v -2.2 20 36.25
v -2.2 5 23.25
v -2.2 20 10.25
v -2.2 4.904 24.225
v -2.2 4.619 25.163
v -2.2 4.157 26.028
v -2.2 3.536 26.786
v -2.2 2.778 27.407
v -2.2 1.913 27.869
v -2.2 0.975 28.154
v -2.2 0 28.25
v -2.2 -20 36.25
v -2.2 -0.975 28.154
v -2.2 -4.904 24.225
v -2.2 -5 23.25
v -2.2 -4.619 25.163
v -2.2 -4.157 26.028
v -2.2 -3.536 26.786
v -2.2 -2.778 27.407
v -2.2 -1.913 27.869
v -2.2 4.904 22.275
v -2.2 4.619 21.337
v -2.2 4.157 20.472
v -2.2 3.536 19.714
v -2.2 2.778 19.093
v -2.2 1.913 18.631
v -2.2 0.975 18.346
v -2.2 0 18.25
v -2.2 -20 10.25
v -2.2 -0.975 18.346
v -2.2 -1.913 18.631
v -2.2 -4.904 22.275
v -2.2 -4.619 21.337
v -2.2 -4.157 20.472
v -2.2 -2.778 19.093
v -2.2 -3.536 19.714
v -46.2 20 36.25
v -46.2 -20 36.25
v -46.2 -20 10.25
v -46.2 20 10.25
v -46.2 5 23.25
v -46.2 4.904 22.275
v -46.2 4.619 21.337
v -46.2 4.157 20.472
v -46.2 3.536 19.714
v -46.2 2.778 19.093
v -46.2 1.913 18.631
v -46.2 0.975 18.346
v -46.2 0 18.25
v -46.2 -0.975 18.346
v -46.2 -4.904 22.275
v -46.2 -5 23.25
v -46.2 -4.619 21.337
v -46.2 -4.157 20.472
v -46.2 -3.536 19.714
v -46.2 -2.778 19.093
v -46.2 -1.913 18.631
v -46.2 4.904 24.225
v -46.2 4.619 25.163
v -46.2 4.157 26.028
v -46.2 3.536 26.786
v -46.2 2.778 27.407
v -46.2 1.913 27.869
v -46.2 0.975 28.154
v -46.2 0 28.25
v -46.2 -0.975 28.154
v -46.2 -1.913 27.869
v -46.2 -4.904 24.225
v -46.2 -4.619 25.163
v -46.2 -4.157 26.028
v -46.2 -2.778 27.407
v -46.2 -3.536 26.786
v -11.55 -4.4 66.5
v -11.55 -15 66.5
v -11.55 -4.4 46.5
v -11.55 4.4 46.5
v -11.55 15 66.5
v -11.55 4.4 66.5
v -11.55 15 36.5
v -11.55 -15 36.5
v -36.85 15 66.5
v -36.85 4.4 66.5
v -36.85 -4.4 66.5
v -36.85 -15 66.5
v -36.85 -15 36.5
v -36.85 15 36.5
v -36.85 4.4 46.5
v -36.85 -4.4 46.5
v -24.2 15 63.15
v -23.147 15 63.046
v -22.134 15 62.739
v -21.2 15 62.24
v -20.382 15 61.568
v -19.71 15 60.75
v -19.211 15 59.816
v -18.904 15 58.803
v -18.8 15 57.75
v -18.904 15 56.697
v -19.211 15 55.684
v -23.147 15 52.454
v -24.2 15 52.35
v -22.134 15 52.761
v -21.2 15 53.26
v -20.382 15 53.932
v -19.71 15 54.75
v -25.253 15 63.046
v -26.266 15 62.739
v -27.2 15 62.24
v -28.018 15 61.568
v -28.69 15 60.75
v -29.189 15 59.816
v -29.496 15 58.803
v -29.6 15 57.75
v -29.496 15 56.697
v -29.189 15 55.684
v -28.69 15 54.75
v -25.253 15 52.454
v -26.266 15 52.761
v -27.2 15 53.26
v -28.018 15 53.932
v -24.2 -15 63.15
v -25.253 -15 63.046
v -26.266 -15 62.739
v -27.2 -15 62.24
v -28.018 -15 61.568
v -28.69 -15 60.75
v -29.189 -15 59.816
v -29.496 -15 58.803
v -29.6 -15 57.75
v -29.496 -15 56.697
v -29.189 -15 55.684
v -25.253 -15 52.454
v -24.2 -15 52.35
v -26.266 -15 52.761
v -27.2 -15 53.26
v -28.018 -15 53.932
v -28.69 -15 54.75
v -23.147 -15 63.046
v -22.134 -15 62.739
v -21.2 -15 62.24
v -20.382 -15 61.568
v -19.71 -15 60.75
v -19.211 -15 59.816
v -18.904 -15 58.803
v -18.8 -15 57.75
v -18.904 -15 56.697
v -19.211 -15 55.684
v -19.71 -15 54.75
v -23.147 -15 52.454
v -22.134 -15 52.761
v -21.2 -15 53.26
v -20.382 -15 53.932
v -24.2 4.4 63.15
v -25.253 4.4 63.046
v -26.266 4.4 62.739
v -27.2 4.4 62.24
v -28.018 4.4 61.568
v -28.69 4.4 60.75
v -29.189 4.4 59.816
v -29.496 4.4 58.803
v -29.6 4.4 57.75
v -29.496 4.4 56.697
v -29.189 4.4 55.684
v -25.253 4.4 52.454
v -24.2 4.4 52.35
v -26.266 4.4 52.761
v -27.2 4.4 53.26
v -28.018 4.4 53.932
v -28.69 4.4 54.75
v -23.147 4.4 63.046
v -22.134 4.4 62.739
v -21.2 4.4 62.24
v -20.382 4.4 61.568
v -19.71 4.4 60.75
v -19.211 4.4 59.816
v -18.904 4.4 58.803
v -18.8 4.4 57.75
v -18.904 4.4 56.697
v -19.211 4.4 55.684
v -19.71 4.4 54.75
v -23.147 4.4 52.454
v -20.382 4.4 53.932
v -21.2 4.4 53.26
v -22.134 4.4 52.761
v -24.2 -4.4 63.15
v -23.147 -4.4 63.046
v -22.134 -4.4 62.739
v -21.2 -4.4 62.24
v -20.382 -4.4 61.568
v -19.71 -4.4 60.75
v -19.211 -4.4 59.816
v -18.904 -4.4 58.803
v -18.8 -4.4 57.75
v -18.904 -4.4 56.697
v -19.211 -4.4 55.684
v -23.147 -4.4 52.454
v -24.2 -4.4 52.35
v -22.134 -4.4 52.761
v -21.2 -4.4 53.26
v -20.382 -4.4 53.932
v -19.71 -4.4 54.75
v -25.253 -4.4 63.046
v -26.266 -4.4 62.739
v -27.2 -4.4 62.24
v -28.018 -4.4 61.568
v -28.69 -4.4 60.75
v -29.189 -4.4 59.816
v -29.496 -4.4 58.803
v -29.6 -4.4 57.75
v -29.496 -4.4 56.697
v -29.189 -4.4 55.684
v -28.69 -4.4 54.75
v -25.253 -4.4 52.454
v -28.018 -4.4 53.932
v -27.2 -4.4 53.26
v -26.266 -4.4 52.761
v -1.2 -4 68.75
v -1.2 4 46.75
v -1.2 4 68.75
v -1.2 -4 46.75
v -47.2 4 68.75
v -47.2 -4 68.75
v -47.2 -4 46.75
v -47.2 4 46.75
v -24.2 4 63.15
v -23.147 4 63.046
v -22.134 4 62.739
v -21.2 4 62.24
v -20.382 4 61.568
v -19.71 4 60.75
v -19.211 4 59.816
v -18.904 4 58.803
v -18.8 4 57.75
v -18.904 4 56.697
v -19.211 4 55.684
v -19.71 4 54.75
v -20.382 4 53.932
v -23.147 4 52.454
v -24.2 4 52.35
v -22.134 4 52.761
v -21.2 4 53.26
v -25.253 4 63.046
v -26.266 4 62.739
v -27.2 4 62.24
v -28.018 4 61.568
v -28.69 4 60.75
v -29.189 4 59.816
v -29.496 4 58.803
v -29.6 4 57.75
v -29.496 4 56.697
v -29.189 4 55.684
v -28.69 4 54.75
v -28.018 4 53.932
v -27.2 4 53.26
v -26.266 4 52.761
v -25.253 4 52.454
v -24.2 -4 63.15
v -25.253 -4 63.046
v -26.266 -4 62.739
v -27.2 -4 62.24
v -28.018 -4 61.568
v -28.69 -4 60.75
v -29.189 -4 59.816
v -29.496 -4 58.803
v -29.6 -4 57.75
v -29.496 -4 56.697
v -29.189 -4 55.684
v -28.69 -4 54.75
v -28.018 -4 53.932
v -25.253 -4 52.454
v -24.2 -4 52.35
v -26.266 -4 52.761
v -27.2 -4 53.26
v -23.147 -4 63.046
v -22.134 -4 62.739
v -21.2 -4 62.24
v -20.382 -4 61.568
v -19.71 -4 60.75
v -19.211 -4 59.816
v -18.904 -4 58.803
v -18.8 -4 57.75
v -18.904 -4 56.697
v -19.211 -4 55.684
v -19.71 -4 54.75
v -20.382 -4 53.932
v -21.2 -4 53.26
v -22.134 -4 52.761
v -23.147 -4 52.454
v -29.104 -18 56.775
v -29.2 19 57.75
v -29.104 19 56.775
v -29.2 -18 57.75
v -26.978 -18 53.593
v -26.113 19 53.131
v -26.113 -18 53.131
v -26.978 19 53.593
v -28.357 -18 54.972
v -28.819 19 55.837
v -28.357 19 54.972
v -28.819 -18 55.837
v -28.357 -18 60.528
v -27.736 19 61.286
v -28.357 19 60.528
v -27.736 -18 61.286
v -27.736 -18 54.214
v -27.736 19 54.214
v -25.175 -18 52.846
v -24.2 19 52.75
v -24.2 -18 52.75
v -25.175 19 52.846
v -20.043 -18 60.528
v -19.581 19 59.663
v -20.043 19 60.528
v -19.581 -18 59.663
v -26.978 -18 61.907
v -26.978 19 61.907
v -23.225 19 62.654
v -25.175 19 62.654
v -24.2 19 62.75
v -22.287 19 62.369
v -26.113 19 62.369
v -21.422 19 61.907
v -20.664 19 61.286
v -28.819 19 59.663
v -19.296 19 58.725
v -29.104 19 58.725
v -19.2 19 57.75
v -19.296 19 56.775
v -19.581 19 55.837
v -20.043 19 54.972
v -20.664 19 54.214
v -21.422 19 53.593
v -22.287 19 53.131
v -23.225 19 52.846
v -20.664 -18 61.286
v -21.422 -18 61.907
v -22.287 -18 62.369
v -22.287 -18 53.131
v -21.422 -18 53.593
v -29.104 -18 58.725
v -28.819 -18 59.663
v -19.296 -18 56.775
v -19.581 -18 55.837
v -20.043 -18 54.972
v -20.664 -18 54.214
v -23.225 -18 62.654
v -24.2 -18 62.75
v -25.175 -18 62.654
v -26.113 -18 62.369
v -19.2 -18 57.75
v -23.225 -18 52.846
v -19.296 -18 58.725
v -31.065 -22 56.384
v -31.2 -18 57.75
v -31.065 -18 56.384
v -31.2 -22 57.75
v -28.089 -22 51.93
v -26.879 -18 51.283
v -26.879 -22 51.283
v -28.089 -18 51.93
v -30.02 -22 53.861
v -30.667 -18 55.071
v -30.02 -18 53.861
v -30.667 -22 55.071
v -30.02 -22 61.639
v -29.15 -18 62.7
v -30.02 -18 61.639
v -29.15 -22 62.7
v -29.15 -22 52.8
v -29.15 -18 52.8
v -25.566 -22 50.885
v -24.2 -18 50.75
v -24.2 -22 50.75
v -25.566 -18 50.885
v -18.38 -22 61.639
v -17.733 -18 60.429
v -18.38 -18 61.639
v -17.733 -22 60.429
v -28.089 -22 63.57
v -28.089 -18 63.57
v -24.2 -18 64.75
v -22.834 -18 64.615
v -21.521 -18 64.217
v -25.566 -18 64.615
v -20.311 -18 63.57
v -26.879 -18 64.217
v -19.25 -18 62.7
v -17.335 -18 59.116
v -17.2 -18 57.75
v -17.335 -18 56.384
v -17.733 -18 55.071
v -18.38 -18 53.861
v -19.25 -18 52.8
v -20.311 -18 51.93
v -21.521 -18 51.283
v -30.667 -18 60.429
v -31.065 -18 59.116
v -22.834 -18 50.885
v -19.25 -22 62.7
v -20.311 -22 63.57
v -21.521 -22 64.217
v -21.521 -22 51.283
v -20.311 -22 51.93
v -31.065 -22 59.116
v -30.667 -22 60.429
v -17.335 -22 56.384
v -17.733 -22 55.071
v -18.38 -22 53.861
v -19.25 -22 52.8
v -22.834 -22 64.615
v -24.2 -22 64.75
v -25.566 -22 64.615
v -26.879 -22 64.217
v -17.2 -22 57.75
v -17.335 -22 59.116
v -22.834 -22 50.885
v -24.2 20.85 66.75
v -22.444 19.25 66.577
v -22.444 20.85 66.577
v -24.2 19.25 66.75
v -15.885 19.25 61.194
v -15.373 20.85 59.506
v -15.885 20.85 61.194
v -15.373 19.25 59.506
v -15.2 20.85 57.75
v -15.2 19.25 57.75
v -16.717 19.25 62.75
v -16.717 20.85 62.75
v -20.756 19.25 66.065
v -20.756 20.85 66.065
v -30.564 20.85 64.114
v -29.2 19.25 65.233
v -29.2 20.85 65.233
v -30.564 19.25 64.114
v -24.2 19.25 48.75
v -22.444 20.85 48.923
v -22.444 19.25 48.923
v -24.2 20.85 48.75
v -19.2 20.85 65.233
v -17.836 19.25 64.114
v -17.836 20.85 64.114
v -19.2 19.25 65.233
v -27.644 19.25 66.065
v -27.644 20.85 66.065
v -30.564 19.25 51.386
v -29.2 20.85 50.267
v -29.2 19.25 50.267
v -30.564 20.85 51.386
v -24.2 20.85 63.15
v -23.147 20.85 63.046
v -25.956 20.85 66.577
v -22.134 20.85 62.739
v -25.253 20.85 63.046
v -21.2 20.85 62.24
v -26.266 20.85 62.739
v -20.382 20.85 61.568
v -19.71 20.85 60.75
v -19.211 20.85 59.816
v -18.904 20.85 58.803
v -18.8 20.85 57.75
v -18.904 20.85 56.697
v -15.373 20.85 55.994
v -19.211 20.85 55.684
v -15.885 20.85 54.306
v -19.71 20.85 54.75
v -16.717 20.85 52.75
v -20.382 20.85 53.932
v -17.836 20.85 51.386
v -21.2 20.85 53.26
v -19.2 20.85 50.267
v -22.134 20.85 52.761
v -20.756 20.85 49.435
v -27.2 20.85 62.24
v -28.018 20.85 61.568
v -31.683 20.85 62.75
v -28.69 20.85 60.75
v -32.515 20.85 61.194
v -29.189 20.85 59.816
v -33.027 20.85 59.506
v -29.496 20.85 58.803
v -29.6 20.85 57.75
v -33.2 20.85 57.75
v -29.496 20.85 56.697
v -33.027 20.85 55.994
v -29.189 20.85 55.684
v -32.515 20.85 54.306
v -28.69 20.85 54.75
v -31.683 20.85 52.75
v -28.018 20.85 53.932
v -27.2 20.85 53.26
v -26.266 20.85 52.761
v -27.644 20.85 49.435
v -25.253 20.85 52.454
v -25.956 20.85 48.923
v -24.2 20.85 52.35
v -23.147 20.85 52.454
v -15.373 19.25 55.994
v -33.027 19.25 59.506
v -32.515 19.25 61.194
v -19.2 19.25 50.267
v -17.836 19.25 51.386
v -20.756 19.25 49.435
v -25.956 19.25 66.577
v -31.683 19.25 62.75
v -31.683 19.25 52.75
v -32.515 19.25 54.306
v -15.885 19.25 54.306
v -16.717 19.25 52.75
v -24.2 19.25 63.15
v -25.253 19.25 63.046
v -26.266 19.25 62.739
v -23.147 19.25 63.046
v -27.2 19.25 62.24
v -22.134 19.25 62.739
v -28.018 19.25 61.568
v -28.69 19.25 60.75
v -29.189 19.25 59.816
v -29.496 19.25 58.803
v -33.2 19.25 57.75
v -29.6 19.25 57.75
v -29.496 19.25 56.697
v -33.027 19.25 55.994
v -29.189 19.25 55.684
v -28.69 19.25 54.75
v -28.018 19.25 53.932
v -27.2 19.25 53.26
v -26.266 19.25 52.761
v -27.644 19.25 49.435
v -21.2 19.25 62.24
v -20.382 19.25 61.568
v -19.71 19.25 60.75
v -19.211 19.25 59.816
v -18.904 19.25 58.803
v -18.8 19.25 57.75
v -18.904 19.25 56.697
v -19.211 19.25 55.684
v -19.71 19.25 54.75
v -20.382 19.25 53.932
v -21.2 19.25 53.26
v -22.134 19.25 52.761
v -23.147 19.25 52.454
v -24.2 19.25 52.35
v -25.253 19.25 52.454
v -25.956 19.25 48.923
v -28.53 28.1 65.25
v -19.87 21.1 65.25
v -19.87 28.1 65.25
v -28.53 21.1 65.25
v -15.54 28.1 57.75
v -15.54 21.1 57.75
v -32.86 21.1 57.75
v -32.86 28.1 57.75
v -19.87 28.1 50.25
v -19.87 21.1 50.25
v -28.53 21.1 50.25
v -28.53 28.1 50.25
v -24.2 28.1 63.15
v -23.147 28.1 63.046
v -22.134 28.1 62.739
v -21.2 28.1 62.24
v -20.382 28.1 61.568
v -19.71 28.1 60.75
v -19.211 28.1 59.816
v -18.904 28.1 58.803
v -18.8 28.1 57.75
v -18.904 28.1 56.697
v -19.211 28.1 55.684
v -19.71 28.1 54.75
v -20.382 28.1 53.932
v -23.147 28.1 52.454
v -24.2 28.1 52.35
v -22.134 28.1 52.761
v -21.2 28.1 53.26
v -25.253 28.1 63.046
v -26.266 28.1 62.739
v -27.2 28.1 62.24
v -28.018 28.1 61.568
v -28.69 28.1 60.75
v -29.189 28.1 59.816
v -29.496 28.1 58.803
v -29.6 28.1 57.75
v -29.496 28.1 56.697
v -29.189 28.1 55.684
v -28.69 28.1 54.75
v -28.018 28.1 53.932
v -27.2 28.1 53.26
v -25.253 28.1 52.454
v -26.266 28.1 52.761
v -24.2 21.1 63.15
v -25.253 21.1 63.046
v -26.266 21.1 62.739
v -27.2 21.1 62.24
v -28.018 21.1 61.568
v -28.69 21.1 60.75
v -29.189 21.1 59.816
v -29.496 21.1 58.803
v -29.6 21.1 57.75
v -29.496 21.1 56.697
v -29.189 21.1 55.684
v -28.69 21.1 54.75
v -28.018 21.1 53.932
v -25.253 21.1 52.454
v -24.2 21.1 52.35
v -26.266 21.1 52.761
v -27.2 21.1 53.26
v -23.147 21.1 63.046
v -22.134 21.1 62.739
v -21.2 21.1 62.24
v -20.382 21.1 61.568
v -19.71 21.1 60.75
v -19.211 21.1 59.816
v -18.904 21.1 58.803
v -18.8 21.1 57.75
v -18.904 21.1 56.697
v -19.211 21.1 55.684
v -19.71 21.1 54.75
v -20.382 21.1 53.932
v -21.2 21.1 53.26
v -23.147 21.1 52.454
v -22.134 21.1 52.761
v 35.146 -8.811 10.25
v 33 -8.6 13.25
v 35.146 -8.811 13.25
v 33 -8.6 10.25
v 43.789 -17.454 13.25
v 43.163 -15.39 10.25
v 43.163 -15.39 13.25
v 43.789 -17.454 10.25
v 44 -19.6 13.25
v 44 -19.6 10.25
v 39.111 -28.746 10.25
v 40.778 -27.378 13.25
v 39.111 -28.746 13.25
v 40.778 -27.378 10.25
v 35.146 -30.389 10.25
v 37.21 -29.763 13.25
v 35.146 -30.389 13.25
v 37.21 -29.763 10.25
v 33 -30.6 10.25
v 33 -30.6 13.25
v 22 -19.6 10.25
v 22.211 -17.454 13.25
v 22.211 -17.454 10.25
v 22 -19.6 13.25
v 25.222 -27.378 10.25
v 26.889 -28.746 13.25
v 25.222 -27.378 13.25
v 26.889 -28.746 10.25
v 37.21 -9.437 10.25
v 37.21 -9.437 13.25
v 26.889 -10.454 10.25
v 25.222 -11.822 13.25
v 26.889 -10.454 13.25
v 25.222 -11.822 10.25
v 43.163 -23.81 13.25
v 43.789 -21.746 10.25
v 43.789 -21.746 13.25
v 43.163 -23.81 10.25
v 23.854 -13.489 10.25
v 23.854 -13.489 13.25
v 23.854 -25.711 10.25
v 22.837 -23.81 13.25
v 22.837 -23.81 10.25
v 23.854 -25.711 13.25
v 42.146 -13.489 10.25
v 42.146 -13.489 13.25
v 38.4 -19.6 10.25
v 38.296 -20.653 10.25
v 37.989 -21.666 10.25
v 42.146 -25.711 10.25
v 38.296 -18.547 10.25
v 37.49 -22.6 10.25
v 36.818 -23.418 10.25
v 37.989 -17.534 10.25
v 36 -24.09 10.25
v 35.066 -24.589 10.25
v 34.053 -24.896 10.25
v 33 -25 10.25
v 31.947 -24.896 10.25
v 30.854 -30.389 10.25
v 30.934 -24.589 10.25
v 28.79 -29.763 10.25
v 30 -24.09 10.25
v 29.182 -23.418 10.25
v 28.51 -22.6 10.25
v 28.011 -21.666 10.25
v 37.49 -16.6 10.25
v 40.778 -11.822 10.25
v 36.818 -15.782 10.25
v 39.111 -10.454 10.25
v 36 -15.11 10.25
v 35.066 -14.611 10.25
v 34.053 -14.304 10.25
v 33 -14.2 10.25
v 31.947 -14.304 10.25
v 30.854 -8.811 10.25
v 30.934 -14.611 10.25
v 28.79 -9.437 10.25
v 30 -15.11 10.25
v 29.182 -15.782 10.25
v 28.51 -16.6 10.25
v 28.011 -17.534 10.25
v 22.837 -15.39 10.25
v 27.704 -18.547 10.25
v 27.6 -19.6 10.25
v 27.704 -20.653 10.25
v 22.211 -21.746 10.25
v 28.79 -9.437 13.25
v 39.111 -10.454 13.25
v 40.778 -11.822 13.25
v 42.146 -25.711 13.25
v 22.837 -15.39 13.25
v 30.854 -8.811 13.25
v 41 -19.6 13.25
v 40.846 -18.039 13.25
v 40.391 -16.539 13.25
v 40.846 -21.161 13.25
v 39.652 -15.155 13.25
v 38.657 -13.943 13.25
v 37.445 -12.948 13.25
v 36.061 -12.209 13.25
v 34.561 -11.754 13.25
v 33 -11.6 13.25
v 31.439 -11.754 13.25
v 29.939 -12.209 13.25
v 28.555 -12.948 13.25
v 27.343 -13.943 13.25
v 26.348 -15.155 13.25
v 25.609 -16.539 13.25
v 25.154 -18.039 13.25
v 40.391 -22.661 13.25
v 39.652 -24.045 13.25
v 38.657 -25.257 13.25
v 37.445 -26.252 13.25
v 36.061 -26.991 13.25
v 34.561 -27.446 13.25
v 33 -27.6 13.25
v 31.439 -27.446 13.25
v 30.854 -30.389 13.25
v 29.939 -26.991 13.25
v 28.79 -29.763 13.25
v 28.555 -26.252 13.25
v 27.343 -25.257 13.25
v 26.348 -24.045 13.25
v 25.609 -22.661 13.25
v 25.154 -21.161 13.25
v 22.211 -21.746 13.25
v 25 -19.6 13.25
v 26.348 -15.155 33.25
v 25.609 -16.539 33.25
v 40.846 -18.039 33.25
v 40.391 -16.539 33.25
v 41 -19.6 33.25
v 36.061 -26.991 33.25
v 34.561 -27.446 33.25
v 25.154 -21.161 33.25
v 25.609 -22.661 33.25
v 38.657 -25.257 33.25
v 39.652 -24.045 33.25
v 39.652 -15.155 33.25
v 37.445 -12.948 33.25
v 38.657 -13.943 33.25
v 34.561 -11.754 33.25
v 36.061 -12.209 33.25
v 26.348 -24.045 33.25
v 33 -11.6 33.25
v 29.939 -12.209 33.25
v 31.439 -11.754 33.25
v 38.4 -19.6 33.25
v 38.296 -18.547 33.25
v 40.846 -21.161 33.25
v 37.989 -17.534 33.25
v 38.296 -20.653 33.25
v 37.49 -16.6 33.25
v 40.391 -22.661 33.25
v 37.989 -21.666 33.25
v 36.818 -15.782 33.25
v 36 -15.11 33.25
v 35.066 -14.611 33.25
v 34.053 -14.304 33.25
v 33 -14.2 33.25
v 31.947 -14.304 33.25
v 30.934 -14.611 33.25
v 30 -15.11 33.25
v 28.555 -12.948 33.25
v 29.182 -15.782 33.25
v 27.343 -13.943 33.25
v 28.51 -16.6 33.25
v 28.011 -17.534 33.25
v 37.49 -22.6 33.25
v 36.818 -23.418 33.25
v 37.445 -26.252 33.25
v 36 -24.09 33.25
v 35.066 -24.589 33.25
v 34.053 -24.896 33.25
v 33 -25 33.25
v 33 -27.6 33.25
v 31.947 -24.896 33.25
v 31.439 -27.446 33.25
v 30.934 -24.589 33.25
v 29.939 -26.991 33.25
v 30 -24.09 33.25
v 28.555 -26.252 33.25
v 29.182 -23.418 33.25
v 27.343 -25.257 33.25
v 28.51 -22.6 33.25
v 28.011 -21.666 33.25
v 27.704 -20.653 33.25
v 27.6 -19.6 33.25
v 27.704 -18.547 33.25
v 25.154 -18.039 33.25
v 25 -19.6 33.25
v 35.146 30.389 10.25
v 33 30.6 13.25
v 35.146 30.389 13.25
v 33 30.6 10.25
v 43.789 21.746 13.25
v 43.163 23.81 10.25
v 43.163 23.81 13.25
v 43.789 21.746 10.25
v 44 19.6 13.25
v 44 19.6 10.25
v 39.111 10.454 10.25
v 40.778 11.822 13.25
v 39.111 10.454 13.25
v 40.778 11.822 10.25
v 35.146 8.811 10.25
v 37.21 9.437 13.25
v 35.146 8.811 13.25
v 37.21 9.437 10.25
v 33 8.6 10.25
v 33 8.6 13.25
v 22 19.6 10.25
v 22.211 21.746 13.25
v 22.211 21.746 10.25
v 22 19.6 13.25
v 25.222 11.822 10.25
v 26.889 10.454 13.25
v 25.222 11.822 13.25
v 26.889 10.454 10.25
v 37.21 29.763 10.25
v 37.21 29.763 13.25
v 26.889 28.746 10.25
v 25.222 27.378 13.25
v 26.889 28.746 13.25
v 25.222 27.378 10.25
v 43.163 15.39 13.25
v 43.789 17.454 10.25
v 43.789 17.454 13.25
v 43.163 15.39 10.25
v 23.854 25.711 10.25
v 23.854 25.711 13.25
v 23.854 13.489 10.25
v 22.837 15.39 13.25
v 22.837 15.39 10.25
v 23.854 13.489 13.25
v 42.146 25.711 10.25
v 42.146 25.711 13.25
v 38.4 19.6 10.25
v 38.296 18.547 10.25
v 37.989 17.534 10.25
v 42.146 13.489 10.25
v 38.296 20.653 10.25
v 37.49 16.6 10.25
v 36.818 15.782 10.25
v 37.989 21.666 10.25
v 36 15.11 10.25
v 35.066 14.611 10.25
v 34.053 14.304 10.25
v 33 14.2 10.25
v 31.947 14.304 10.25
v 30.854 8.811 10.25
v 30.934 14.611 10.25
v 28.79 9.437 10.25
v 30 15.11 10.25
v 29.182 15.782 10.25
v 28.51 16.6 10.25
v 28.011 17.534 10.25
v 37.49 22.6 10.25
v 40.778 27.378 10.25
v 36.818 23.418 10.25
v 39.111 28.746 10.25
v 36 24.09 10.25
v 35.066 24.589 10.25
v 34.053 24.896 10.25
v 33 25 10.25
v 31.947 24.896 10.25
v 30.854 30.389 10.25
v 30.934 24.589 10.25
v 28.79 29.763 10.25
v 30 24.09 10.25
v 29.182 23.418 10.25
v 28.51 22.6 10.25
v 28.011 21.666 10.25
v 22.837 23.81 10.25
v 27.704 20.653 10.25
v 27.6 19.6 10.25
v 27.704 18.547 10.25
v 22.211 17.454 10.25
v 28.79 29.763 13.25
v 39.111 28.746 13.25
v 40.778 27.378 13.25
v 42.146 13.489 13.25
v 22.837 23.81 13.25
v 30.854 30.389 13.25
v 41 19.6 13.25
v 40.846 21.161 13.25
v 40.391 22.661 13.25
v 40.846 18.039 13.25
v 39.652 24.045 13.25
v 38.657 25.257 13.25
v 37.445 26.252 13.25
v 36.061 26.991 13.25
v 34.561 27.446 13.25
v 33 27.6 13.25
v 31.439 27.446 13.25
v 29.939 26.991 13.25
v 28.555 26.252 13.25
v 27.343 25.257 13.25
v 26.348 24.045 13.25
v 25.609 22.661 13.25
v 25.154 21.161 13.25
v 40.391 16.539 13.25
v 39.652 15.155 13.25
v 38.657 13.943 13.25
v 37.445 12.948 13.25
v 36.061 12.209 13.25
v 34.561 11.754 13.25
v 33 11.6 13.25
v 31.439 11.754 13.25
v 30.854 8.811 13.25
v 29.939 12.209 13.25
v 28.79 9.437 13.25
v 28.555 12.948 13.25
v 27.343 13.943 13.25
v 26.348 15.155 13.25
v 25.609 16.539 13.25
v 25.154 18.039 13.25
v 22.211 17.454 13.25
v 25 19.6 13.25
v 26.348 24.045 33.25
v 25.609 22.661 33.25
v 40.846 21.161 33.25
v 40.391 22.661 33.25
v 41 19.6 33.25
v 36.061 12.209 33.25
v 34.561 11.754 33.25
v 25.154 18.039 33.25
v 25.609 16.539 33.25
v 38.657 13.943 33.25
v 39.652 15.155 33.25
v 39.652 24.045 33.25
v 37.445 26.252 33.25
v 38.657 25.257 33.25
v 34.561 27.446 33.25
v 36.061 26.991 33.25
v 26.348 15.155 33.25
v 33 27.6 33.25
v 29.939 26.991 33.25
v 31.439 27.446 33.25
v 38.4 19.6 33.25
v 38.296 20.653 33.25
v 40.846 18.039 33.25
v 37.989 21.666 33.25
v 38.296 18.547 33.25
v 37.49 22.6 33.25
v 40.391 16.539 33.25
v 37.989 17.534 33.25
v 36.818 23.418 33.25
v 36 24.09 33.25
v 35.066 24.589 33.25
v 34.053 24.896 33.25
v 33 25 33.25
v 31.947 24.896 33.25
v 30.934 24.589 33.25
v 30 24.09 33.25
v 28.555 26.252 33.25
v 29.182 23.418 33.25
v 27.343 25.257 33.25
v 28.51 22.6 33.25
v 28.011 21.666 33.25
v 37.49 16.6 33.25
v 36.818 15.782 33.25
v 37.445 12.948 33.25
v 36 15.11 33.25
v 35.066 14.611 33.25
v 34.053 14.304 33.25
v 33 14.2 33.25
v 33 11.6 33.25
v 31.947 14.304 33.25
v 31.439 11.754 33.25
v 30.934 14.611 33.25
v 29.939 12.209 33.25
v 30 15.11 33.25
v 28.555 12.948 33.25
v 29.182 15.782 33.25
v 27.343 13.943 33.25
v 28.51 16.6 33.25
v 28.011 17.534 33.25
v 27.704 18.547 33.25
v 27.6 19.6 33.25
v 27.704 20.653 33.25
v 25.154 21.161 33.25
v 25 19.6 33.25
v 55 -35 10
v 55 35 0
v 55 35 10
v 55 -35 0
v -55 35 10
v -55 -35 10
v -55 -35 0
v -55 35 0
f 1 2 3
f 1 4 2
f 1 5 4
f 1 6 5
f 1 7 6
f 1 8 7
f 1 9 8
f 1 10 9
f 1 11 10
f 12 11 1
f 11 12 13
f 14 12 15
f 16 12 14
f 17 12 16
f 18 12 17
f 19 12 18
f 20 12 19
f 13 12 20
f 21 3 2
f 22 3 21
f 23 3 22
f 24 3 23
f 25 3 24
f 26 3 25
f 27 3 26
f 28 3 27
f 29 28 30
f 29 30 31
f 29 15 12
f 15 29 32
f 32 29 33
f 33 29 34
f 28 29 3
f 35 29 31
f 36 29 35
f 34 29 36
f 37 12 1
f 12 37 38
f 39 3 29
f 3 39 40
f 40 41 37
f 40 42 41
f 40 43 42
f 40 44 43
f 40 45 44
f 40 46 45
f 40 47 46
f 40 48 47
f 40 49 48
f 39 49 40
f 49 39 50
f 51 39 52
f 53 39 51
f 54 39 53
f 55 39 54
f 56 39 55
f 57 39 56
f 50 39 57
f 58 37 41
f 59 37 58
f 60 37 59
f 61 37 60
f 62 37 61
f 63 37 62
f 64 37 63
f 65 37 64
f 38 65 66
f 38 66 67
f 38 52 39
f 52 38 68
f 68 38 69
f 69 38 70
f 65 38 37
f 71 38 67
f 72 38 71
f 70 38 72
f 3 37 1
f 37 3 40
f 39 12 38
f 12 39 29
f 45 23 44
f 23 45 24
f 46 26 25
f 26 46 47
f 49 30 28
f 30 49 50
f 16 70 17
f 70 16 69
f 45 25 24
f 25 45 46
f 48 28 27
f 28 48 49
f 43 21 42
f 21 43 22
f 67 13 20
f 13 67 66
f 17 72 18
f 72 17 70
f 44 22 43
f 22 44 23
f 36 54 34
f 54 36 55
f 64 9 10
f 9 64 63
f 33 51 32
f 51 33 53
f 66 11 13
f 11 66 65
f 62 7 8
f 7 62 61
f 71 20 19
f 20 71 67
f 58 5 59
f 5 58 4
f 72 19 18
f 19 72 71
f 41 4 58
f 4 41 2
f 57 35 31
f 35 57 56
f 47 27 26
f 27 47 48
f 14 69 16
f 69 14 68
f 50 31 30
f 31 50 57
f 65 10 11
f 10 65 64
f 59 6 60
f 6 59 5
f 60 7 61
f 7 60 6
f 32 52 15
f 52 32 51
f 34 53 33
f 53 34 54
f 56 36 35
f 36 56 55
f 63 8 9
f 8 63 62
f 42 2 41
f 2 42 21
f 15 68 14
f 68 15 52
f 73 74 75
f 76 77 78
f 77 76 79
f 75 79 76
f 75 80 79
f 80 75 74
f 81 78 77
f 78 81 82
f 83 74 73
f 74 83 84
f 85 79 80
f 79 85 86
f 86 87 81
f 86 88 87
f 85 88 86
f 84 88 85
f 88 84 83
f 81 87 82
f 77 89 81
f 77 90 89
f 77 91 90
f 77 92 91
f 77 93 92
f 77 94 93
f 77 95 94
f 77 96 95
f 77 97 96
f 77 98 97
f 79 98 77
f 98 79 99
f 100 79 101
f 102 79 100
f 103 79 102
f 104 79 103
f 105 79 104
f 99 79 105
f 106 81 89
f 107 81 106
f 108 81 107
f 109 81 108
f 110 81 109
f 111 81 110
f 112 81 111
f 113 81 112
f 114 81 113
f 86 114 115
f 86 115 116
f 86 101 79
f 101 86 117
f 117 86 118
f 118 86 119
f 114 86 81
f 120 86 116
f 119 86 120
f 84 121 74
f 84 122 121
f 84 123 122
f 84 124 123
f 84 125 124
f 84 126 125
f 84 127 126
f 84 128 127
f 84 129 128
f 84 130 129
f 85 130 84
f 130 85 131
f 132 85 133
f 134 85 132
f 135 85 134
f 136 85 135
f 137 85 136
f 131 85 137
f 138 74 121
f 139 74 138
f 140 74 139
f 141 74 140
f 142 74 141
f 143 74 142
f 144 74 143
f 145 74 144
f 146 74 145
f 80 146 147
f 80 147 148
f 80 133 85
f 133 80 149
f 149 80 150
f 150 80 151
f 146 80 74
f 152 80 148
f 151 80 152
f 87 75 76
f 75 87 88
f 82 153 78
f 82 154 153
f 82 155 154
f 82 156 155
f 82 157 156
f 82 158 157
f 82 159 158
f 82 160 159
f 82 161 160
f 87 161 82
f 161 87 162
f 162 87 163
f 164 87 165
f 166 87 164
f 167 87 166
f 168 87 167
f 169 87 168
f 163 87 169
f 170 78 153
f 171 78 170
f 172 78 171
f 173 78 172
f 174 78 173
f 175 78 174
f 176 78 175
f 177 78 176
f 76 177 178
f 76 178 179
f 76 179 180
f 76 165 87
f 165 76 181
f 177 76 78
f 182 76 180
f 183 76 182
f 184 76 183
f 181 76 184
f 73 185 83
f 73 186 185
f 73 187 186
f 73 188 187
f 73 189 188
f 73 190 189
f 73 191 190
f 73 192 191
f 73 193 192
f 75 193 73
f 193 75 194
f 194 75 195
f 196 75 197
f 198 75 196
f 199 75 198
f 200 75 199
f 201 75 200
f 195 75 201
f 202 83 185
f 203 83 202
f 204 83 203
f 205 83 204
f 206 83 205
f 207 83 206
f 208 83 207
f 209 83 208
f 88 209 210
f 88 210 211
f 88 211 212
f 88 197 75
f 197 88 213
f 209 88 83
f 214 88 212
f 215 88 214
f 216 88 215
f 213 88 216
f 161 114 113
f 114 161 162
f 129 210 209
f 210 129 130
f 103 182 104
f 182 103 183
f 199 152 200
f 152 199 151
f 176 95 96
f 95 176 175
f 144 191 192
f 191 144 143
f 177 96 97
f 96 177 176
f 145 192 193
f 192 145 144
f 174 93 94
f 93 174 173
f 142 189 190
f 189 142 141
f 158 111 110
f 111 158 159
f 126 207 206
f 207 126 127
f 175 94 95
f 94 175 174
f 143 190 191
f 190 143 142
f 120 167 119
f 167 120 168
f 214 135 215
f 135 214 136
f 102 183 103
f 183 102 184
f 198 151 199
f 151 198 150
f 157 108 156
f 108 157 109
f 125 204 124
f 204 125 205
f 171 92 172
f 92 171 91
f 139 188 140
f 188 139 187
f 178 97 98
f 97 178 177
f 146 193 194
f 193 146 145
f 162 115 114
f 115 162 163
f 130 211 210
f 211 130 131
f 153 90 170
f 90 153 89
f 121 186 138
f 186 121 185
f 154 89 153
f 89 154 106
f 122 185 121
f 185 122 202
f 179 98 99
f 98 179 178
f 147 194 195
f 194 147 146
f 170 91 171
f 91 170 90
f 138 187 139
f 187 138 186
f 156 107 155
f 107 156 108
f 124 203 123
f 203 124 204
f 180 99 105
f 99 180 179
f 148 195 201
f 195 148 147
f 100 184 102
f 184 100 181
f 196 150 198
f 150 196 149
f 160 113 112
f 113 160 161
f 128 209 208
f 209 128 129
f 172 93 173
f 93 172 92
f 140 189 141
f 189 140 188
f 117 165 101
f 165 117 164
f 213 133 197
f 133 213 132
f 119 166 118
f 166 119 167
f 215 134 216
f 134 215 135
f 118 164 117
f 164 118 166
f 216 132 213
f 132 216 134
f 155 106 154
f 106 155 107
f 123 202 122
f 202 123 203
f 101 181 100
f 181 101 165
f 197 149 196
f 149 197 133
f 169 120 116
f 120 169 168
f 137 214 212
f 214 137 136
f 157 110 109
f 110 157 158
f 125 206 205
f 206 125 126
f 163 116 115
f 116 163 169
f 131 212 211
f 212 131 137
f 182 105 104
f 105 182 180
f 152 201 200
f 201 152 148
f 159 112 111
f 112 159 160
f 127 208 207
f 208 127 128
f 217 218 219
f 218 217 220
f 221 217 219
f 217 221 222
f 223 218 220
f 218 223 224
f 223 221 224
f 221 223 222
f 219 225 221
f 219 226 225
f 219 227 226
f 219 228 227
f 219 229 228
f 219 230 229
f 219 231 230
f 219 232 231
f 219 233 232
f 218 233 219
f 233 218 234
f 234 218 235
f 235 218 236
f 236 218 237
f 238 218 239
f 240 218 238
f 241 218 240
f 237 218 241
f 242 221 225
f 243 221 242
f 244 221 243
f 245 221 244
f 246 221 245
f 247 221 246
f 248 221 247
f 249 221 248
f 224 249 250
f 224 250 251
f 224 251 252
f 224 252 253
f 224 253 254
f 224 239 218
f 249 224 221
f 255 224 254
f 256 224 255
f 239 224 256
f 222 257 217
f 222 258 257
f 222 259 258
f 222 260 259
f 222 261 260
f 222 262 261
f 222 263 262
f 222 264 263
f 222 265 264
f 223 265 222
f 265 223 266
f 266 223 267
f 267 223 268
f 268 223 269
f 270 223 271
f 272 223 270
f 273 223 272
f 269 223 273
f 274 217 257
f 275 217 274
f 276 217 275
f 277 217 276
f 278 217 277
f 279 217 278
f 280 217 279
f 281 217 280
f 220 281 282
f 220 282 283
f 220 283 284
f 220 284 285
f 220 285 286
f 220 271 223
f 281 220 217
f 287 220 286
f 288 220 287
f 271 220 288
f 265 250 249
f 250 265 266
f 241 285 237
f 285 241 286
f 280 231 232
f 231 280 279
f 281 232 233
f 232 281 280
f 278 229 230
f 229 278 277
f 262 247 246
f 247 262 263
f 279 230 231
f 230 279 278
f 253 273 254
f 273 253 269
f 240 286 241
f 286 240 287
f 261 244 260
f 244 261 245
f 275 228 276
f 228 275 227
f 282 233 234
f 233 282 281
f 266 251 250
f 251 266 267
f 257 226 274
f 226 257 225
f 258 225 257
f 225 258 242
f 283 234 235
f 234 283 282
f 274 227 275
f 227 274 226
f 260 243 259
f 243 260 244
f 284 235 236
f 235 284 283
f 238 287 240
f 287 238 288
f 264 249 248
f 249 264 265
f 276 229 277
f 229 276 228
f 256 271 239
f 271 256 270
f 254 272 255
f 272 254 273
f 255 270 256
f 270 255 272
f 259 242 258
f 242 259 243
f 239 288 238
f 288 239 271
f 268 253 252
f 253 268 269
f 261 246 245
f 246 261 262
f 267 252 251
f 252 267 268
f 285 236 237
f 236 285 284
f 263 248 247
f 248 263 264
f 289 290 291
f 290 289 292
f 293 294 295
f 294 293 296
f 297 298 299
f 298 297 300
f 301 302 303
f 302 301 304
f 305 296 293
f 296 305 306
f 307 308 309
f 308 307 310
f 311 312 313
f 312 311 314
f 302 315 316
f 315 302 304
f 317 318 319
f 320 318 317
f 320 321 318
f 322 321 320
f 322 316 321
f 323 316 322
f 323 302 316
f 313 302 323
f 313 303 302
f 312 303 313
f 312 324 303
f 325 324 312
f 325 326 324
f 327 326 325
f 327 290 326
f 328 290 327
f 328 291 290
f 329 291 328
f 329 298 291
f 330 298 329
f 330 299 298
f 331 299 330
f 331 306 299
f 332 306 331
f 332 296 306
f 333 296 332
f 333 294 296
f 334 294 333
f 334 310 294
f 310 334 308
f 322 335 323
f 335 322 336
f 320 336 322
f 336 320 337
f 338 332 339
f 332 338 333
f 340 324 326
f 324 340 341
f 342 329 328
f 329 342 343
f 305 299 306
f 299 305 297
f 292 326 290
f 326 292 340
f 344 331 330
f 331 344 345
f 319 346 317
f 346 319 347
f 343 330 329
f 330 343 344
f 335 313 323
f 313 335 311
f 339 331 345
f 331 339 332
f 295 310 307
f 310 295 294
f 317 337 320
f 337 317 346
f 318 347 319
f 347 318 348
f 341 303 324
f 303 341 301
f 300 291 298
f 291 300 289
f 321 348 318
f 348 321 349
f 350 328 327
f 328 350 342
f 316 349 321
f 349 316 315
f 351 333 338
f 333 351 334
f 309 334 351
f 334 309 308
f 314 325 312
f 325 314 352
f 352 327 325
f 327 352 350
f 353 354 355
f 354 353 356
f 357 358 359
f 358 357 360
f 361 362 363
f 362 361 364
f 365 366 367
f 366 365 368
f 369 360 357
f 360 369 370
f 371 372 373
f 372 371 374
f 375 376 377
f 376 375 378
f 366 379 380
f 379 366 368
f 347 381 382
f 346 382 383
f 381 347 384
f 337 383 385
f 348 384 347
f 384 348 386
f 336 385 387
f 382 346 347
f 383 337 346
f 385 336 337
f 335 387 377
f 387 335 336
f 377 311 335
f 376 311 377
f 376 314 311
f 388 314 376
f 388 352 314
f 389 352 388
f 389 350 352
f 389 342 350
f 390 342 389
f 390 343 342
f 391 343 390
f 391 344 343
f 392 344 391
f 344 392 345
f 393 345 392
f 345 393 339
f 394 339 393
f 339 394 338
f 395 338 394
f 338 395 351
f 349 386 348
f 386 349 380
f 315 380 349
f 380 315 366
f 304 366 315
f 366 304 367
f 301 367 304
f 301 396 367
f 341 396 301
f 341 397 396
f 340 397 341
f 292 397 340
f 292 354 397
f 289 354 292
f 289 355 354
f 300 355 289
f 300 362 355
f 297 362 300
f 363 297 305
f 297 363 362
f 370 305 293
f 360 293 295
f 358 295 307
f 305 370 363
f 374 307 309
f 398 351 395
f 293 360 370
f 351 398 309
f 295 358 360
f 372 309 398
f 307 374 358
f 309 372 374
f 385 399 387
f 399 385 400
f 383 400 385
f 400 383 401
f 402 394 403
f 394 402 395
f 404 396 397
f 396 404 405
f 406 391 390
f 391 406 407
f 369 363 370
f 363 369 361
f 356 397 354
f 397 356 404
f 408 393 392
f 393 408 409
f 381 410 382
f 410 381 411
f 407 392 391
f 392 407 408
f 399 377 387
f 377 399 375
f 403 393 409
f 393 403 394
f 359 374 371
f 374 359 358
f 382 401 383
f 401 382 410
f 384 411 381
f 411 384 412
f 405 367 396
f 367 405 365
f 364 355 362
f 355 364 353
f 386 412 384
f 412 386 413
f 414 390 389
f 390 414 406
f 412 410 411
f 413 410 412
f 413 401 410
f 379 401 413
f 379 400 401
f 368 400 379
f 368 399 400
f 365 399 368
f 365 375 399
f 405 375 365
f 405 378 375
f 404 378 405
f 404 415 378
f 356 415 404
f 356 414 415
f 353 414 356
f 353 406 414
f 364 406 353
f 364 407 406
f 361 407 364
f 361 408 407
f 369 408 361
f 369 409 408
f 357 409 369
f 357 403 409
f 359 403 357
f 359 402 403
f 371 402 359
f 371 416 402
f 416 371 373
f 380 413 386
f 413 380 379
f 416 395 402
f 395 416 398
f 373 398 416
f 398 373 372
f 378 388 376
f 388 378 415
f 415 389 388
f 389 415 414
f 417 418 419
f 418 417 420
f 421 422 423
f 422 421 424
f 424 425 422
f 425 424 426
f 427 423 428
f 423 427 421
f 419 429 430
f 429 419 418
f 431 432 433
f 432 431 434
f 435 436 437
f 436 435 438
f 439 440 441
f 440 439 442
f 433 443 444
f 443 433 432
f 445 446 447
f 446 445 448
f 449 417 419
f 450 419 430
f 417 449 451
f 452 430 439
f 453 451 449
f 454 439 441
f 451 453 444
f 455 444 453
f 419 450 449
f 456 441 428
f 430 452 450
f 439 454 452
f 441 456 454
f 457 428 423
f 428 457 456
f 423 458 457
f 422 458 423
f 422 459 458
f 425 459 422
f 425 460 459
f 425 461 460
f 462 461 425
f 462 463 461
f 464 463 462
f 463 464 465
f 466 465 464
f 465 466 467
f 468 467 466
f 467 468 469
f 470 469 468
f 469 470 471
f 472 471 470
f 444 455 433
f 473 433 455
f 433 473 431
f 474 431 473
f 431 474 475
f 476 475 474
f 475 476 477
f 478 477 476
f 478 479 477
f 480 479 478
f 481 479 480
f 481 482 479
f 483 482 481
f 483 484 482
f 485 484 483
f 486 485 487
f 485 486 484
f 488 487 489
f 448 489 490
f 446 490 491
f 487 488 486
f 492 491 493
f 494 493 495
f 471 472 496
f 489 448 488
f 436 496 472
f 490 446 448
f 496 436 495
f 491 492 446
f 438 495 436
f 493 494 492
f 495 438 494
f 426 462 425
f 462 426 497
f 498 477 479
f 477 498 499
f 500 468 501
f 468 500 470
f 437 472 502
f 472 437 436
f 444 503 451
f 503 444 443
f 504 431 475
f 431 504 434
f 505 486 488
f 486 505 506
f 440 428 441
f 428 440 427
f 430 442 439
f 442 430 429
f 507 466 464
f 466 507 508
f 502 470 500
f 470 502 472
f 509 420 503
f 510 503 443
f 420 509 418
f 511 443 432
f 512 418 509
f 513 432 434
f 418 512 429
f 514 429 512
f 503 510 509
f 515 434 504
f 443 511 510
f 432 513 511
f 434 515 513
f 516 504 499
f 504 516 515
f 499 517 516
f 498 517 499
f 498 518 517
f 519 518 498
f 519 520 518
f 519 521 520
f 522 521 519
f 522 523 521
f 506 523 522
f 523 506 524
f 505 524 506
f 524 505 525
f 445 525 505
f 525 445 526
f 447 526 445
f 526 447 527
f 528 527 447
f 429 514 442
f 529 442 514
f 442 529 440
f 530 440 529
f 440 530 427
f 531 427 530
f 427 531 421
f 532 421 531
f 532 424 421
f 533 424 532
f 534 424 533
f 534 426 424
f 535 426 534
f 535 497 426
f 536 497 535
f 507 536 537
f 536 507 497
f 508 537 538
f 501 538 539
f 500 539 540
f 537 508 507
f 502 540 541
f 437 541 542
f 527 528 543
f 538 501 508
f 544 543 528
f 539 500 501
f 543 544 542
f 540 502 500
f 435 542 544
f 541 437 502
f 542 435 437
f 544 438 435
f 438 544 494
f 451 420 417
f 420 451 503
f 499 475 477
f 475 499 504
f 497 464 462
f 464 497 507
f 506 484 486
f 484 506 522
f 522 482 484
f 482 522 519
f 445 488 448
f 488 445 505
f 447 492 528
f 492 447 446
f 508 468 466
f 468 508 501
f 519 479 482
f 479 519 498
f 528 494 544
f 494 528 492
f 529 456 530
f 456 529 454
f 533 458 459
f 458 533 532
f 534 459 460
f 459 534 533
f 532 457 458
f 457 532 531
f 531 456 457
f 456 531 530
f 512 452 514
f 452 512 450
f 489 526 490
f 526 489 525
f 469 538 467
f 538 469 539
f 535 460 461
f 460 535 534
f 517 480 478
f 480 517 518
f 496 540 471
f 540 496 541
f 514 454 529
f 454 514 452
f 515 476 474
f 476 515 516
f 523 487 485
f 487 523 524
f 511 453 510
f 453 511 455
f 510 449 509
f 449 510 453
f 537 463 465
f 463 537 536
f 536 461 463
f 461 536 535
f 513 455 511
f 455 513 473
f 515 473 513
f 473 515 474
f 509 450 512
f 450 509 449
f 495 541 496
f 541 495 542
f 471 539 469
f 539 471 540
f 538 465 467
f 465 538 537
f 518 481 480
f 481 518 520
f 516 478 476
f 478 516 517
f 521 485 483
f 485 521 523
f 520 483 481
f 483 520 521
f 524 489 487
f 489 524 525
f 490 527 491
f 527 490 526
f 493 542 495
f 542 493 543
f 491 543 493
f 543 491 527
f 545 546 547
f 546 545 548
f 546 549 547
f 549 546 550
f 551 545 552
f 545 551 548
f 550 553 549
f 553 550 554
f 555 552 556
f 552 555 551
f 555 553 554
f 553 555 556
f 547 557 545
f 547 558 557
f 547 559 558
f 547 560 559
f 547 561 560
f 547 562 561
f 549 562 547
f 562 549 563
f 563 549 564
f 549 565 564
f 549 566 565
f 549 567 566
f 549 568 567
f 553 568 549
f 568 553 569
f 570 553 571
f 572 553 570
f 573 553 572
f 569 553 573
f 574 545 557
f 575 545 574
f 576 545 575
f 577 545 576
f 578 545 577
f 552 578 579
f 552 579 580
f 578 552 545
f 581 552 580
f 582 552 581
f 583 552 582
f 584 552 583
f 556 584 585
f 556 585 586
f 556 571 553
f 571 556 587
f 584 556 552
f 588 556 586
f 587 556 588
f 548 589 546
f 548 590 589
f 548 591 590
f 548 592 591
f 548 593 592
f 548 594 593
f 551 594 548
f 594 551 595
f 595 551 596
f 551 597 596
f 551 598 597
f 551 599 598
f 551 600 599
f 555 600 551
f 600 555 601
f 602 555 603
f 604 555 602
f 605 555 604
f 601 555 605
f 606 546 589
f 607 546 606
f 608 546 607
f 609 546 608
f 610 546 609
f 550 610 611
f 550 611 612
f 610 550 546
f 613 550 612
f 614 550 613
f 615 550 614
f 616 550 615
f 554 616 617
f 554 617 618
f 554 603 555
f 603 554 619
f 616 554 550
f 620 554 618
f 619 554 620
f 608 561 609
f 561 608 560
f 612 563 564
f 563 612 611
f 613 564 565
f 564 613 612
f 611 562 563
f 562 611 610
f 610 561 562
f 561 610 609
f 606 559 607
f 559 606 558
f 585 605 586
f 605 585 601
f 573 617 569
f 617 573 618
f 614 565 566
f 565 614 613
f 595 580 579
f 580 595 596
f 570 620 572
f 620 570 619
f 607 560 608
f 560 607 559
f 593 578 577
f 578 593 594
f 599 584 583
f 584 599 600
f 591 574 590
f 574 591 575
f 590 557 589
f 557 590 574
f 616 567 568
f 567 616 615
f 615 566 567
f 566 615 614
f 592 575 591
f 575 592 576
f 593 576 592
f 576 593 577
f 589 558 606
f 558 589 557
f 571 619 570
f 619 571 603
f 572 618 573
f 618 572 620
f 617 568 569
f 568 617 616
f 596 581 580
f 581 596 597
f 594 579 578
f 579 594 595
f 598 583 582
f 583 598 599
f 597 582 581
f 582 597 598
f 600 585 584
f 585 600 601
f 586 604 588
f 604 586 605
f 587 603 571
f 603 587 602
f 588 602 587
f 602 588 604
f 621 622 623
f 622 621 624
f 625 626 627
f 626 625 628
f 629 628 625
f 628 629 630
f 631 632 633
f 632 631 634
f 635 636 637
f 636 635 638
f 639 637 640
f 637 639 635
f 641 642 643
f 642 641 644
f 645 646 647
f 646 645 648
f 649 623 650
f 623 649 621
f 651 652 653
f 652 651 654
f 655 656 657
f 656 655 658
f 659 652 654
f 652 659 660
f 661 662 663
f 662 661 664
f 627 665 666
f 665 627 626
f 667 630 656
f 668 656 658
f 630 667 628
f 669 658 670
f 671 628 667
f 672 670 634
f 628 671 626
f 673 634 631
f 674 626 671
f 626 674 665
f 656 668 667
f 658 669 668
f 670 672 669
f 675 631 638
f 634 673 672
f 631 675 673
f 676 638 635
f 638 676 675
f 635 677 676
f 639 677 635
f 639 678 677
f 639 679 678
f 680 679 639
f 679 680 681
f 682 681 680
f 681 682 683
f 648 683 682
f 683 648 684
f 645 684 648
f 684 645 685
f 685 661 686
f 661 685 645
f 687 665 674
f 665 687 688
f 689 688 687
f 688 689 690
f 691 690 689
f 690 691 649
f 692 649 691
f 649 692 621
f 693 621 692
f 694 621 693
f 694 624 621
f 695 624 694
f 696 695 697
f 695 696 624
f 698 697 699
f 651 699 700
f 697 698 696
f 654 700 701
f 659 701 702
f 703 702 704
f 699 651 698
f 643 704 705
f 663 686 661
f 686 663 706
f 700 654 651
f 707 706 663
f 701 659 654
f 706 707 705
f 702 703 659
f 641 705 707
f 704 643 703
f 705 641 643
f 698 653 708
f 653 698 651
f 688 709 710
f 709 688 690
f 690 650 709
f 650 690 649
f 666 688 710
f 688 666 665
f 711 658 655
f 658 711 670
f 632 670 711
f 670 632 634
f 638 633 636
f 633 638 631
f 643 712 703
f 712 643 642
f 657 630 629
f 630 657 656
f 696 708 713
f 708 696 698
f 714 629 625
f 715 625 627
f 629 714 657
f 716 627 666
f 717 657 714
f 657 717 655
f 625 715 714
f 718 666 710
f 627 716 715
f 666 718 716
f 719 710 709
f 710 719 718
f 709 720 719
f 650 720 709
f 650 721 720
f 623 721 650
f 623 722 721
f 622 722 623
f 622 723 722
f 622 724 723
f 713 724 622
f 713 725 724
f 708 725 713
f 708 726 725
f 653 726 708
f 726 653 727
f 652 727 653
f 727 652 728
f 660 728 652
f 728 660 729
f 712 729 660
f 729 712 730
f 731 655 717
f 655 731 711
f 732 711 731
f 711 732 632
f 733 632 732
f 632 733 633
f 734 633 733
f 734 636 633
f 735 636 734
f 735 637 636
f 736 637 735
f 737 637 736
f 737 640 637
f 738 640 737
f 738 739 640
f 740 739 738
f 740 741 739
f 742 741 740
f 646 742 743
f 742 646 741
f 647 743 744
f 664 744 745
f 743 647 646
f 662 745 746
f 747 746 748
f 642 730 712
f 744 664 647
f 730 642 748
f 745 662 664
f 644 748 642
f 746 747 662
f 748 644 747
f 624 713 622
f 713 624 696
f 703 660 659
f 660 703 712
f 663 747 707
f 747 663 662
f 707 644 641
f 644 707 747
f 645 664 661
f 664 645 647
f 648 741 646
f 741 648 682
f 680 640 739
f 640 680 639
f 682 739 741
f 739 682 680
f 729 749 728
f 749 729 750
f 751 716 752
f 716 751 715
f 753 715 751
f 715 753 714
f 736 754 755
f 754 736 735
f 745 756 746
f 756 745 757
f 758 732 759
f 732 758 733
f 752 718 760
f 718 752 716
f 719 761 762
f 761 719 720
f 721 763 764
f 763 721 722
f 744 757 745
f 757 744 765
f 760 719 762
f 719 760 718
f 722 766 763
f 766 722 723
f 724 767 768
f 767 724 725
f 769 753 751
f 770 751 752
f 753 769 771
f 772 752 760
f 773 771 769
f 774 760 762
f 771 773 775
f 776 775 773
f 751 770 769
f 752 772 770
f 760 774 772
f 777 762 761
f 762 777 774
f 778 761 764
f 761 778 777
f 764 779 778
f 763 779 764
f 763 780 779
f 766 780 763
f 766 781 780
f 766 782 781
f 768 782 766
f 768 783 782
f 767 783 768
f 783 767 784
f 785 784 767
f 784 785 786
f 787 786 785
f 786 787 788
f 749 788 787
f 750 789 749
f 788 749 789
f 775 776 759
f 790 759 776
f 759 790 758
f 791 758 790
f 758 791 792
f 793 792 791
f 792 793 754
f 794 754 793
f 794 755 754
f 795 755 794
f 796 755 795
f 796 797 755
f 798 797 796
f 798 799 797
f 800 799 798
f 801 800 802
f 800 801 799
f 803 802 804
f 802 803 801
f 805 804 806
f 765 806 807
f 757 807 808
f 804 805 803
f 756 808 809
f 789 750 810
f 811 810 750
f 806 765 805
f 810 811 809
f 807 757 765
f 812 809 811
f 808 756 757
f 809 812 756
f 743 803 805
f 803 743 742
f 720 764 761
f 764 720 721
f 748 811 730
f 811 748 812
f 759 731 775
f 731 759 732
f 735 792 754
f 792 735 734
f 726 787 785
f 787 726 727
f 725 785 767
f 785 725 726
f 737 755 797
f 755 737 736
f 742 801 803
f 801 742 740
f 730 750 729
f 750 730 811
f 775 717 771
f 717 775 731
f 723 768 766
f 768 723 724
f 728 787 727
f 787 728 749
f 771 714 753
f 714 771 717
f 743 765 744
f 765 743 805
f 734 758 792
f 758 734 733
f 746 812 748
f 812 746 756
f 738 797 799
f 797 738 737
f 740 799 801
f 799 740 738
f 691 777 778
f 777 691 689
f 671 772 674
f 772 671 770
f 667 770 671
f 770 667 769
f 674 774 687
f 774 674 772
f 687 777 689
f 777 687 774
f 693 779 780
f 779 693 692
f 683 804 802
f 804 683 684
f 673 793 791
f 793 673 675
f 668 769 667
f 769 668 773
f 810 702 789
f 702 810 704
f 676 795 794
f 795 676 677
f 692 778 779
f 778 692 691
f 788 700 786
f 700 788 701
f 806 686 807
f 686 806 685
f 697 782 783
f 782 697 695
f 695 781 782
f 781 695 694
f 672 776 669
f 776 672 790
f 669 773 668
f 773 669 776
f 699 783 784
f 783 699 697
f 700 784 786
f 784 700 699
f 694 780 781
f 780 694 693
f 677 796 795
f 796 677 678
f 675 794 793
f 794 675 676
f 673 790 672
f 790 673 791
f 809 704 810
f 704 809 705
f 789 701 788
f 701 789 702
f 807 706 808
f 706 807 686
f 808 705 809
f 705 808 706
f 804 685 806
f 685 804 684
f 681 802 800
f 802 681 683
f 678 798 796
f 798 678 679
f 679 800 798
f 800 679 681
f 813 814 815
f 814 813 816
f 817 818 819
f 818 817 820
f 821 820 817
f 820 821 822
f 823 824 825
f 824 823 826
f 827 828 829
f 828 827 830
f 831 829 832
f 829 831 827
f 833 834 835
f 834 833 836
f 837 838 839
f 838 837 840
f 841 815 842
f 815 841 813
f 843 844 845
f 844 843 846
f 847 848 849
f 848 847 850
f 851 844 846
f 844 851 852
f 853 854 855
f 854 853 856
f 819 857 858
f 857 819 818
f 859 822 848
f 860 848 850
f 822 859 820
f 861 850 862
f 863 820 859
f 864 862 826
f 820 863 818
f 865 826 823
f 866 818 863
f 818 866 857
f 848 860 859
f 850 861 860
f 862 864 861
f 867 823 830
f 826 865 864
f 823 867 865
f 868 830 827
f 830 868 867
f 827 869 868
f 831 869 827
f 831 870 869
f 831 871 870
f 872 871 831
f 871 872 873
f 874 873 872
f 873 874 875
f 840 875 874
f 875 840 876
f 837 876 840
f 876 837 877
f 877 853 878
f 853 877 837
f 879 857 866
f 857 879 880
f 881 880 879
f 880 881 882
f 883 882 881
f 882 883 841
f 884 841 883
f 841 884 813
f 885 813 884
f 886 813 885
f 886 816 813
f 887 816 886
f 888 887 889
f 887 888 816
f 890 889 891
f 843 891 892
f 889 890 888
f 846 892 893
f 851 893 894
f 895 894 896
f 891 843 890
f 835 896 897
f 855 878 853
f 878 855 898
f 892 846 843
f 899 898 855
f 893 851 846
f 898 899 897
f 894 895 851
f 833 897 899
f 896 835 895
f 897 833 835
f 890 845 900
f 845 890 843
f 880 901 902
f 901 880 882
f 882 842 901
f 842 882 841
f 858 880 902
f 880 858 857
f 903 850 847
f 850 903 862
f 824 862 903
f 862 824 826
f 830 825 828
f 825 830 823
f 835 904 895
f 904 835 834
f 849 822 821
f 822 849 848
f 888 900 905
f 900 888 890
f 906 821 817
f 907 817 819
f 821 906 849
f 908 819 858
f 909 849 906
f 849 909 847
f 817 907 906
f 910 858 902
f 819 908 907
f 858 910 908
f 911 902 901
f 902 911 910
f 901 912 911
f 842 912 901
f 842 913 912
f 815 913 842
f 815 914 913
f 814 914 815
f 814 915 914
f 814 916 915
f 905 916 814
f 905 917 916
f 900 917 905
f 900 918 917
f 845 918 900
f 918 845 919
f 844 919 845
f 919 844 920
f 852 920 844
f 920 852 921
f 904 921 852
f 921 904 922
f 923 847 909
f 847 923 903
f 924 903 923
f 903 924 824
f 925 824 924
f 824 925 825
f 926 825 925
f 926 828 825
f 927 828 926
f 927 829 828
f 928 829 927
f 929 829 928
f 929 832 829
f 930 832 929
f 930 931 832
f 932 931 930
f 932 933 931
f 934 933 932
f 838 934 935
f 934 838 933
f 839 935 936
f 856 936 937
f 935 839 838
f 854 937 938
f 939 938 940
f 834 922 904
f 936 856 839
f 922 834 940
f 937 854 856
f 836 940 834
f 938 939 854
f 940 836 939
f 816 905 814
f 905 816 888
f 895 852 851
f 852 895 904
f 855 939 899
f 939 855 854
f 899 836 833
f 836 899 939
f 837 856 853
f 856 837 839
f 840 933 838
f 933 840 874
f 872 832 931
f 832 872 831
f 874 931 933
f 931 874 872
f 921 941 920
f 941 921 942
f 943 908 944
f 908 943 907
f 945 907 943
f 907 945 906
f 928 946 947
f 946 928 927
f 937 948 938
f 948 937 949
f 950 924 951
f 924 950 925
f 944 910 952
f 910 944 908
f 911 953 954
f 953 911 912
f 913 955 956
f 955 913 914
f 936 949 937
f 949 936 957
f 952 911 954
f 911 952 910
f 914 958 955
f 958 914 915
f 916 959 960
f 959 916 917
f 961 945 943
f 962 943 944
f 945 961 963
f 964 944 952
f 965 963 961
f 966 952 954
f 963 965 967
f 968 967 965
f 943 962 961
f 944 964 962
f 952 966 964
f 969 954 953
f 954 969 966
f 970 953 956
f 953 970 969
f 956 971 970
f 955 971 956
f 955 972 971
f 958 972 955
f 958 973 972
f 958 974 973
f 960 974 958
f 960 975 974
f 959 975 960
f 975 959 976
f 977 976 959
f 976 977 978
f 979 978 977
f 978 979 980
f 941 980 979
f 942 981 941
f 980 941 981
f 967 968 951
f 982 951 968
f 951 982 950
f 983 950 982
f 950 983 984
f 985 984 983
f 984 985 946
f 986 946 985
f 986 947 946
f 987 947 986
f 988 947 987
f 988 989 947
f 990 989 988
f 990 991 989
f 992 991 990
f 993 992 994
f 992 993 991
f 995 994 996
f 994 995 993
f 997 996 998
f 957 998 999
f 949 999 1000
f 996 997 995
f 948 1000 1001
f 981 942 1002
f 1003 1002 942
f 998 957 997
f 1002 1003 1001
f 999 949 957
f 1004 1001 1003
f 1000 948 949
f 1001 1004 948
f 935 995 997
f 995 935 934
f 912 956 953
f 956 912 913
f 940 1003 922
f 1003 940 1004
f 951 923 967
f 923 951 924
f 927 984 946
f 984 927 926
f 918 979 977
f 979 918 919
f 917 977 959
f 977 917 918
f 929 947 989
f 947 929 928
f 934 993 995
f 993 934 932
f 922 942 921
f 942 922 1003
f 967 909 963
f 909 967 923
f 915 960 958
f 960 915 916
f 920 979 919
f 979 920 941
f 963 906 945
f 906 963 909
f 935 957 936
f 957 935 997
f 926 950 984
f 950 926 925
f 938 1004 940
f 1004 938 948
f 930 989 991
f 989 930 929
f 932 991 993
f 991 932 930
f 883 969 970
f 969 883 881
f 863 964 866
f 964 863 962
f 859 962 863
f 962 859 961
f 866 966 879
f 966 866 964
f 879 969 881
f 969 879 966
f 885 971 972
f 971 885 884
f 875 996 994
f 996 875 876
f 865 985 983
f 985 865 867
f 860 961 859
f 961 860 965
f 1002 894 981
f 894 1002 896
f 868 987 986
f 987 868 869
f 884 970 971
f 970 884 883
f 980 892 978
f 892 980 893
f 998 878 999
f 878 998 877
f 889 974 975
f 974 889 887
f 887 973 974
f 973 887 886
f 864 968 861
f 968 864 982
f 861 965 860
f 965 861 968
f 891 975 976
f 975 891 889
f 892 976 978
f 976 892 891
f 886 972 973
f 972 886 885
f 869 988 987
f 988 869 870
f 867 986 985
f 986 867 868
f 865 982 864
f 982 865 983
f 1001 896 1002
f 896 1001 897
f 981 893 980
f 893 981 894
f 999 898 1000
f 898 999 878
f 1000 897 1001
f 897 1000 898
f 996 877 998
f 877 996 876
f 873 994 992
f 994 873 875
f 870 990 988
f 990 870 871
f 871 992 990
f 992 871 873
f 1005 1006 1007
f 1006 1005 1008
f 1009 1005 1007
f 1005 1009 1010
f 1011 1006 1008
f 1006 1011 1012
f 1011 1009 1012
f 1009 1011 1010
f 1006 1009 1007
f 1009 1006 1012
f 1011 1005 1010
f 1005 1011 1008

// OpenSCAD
$fn = 32;

// ------------------------------------------------------------------------
// Indexing jig: plate 110 x 70 mm, pin d10
// Every part is its own module, assembly() places every instance.
// ------------------------------------------------------------------------

// --- part 1 ---
module jig_plate() {
  difference() {
    translate([-55, -35, 0]) cube([110, 70, 10]);
  }
}

// --- part 2 ---
module locator_block() {
  difference() {
    translate([-22, -20, 0]) cube([44, 40, 26]);
    translate([0, 0, 13]) rotate([0, 90, 0]) cylinder(h = 46, d = 10, center = true);
  }
}

// --- part 3 ---
module index_fork() {
  difference() {
    translate([-12.65, -15, 0]) cube([25.3, 30, 30]);
    translate([-13.65, -4.4, 10]) cube([27.3, 8.8, 21]);
    translate([0, 0, 21.25]) rotate([90, 0, 0]) cylinder(h = 32, d = 10.8, center = true);
  }
}

// --- part 4 ---
module index_arm() {
  difference() {
    translate([-23, -4, 0]) cube([46, 8, 22]);
    translate([0, 0, 11]) rotate([90, 0, 0]) cylinder(h = 10, d = 10.8, center = true);
  }
}

// --- part 5 ---
module index_pin() {
  rotate([0, 90, 0]) cylinder(h = 38, d = 10, center = true);
  translate([-22, 0, 0]) rotate([0, 90, 0]) cylinder(h = 4, d = 14);
}

// --- part 6 ---
module pin_washer() {
  difference() {
      translate([0, 0, 0]) cylinder(h = 1.6, d = 18);
      translate([0, 0, -1]) cylinder(h = 3.6, d = 10.8);
    }
}

// --- part 7 ---
module lock_nut() {
  difference() {
    linear_extrude(height = 7) polygon(points = [[8.66, 0], [4.33, 7.5], [-4.33, 7.5], [-8.66, 0], [-4.33, -7.5], [4.33, -7.5]]);
    translate([0, 0, -1]) cylinder(h = 9, d = 10.8);
  }
}

// --- part 8 ---
module guide_bush_a() {
  difference() {
    union() {
      cylinder(h = 3, d = 22);
      translate([0, 0, 3]) cylinder(h = 20, d = 16);
    }
    translate([0, 0, -1]) cylinder(h = 25, d = 10.8);
  }
}

// --- part 9 ---
module guide_bush_b() {
  difference() {
    union() {
      cylinder(h = 3, d = 22);
      translate([0, 0, 3]) cylinder(h = 20, d = 16);
    }
    translate([0, 0, -1]) cylinder(h = 25, d = 10.8);
  }
}

// --- assembly ---
module assembly() {
  color([0.80, 0.24, 0.20]) translate([0, 0, 0]) rotate([0, 0, 0]) jig_plate();
  color([0.20, 0.45, 0.75]) translate([-24.2, 0, 10.25]) rotate([0, 0, 0]) locator_block();
  color([0.25, 0.62, 0.32]) translate([-24.2, 0, 36.5]) rotate([0, 0, 0]) index_fork();
  color([0.92, 0.70, 0.18]) translate([-24.2, 0, 46.75]) rotate([0, 0, 0]) index_arm();
  color([0.58, 0.35, 0.70]) translate([-24.2, 0, 57.75]) rotate([0, 0, 90]) index_pin();
  color([0.16, 0.66, 0.66]) translate([-24.2, 20.85, 57.75]) rotate([90, 0, 0]) pin_washer();
  color([0.85, 0.48, 0.18]) translate([-24.2, 28.1, 57.75]) rotate([90, 0, 0]) lock_nut();
  color([0.55, 0.60, 0.65]) translate([33, -19.6, 10.25]) rotate([0, 0, 0]) guide_bush_a();
  color([0.75, 0.30, 0.55]) translate([33, 19.6, 10.25]) rotate([0, 0, 0]) guide_bush_b();
}

assembly();
